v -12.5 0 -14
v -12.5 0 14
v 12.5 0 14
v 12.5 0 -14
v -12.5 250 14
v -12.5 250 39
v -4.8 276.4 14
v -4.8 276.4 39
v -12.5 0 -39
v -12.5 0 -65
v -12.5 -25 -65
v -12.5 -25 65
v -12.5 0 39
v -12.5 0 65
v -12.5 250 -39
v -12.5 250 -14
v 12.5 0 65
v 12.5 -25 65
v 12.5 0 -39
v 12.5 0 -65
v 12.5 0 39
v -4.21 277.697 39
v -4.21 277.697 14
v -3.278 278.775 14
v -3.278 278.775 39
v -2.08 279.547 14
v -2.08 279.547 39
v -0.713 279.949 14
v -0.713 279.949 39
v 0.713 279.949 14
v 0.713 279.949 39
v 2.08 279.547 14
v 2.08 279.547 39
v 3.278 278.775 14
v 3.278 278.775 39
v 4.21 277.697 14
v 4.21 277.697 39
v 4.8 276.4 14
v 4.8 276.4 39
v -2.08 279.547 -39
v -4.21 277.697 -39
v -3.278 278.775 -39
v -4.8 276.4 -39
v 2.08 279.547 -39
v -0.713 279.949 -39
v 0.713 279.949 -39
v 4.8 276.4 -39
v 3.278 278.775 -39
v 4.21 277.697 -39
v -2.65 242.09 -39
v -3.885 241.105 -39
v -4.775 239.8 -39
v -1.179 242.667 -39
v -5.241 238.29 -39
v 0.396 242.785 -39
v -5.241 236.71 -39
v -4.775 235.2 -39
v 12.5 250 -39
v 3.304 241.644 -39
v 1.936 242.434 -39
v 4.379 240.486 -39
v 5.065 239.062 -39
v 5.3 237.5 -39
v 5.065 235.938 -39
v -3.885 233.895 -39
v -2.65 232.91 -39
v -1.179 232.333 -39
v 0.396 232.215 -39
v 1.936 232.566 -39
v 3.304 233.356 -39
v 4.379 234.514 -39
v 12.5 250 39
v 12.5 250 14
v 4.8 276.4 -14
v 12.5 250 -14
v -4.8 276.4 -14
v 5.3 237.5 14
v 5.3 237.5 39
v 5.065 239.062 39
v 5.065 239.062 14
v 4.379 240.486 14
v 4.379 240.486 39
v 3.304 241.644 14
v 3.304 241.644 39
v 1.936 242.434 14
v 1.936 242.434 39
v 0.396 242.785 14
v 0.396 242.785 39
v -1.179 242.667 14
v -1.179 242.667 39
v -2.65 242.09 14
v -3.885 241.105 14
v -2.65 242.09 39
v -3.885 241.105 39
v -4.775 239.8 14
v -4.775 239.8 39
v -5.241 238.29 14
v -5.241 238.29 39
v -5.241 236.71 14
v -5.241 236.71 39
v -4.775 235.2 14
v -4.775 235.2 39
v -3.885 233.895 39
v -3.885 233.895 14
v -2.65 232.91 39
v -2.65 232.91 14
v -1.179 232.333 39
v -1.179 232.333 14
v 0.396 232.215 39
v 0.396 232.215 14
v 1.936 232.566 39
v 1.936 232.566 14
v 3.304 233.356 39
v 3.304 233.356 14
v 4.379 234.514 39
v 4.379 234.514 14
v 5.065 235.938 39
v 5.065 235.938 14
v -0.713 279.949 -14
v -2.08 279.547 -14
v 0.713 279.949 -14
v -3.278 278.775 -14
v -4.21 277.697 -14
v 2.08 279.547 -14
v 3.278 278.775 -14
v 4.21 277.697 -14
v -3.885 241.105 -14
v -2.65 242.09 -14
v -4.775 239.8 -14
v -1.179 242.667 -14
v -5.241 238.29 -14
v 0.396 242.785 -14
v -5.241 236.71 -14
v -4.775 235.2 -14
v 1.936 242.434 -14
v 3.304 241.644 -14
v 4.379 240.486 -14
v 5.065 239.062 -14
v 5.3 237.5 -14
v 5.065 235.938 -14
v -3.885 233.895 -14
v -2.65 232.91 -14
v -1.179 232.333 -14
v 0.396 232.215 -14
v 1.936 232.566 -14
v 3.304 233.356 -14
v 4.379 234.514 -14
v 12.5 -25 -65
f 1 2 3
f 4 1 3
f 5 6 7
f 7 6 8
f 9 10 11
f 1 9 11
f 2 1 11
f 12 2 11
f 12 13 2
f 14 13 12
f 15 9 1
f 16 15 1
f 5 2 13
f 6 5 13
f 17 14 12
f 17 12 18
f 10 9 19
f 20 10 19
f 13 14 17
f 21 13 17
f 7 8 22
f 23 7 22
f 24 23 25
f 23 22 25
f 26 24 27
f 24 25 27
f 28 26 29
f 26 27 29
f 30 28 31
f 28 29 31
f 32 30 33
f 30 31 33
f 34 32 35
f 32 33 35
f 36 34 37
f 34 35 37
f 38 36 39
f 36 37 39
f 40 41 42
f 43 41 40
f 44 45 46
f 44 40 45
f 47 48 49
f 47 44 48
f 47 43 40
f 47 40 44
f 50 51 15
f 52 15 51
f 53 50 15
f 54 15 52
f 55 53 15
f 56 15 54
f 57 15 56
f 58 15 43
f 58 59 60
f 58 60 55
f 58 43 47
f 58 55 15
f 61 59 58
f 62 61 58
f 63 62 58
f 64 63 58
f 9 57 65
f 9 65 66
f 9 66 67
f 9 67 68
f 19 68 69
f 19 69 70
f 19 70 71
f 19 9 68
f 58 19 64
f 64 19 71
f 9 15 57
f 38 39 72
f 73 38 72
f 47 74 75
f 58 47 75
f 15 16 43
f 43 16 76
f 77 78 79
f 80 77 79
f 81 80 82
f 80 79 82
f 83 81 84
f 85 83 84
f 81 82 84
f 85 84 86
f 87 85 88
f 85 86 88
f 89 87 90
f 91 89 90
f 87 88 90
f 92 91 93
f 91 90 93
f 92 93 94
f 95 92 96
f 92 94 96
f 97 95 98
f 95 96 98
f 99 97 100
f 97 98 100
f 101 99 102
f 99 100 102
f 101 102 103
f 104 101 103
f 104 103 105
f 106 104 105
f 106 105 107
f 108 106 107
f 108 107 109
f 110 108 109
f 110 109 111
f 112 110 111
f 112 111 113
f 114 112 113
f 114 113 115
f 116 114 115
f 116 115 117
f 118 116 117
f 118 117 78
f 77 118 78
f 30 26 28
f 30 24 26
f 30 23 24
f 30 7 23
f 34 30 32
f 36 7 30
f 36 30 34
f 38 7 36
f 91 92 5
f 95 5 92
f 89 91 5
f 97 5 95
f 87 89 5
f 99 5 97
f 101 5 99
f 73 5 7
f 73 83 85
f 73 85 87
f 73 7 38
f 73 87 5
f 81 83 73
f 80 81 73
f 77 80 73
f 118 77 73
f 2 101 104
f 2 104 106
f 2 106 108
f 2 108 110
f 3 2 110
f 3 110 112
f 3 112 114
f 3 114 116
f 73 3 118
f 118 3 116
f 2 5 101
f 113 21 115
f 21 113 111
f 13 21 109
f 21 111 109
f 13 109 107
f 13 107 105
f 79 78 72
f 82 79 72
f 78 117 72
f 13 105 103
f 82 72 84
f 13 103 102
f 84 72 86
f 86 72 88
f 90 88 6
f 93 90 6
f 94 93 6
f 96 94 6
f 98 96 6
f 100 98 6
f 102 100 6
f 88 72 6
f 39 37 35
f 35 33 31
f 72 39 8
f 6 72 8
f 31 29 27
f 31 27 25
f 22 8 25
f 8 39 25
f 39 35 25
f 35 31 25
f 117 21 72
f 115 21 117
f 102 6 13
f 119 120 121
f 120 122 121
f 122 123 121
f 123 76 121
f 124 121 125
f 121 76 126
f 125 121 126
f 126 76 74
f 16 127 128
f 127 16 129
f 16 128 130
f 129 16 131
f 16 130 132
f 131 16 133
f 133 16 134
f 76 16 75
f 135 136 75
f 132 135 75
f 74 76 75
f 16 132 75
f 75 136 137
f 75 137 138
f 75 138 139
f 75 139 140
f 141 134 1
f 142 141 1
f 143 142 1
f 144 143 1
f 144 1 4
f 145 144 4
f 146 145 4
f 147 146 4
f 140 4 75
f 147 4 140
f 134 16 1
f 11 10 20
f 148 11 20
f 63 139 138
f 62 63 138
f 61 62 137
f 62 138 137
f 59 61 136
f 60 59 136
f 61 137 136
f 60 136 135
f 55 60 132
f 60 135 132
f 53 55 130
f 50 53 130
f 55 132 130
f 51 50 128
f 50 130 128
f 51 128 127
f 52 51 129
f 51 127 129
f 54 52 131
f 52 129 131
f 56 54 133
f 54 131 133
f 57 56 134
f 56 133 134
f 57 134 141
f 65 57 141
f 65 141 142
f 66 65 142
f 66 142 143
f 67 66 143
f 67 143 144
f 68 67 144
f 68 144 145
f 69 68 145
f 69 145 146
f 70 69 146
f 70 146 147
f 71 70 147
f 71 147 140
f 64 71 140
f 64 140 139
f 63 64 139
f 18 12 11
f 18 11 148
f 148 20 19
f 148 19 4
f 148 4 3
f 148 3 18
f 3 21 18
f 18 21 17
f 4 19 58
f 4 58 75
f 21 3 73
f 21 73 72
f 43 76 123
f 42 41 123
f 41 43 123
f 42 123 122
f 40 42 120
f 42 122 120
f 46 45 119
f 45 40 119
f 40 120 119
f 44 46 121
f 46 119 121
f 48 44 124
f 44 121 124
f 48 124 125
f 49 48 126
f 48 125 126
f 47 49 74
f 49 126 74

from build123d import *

# Parameters (mm, degrees)
SKETCH1_W             = 25
SKETCH1_H             = 25
BOSS_EXTRUDE1_DEPTH   = 250
BOSS_EXTRUDE1_2_DEPTH = 250
SKETCH2_R             = 5.3
CUT_EXTRUDE1_DEPTH    = 263.183618863
BOSS_EXTRUDE2_REACH   = 264.184
SKETCH4_W             = 25
SKETCH4_H             = 28
CUT_EXTRUDE2_DEPTH    = 254.332291665
BOSS_EXTRUDE3_START   = -53
SKETCH5_R             = 5
BOSS_EXTRUDE3_DEPTH   = 28
SKETCH6_W             = 25
SKETCH6_H             = 130
BOSS_EXTRUDE4_DEPTH   = 25
SKETCH7_W             = 25
SKETCH7_H             = 28
CUT_EXTRUDE3_DEPTH    = 323


with BuildPart() as part:
    # Sketch1 → Boss-Extrude1 (new body)
    with BuildSketch(Plane(origin=(0, 0, 0), x_dir=(1, 0, 0), z_dir=(0, 1, 0))):
        with Locations((0, 26.5)):
            Rectangle(SKETCH1_W, SKETCH1_H)
    extrude(amount=BOSS_EXTRUDE1_DEPTH)


with BuildPart() as body_2:
    # Sketch1 → Boss-Extrude1 2 (new body)
    with BuildSketch(Plane(origin=(0, 0, 0), x_dir=(1, 0, 0), z_dir=(0, 1, 0))):
        with Locations((0, -26.5)):
            Rectangle(SKETCH1_W, SKETCH1_H)
    extrude(amount=BOSS_EXTRUDE1_2_DEPTH)


with BuildPart() as cut_extrude1_tool:
    # Sketch2 → Cut-Extrude1 (new, through all)
    with BuildSketch(Plane.XY.offset(39)):
        with Locations((0, 237.5)):
            Circle(SKETCH2_R)
    extrude(amount=-CUT_EXTRUDE1_DEPTH)


with BuildPart() as part_1:
    add(part.part)

    # Cut-Extrude1: cut by cut_extrude1_tool
    add(cut_extrude1_tool.part, mode=Mode.SUBTRACT)

    # Boss-Extrude2: up to this face of the body (flat: up to its plane)
    boss_extrude2_end = Plane(part_1.part.faces().sort_by_distance((0, 123.388798443, -39))[0])
    # Sketch3 → Boss-Extrude2 (add, up to the picked face)
    with BuildSketch(Plane.XY.offset(39), mode=Mode.PRIVATE) as boss_extrude2_sk1:
        with BuildLine():
            Line((-12.5, 250), (-4.8, 276.4))
            ThreePointArc((-4.8, 276.4), (0, 280), (4.8, 276.4))
            Line((4.8, 276.4), (12.5, 250))
            Line((12.5, 250), (-12.5, 250))
        make_face()
    boss_extrude2_tool1 = split(extrude(boss_extrude2_sk1.sketch, amount=-BOSS_EXTRUDE2_REACH, mode=Mode.PRIVATE), bisect_by=boss_extrude2_end, keep=Keep.BOTH, mode=Mode.PRIVATE)


with BuildPart() as body_2_1:
    add(body_2.part)

    # Cut-Extrude1: cut by cut_extrude1_tool
    add(cut_extrude1_tool.part, mode=Mode.SUBTRACT)


with BuildPart() as part_2:
    add(part_1.part)

    add(body_2_1.part)  # Boss-Extrude2 merges body 2
    add(boss_extrude2_tool1.solids().sort_by(Axis((0, 262.12086, 39), (0, 0, -1)))[0])

    # Sketch4 → Cut-Extrude2 (cut, through all)
    with BuildSketch(Plane.XZ.offset(-250)):
        Rectangle(SKETCH4_W, SKETCH4_H)
    extrude(amount=-CUT_EXTRUDE2_DEPTH, mode=Mode.SUBTRACT)


with BuildPart() as cut_extrude2_piece_1:
    # of the separate pieces the step leaves, piece 1, a body of its own (cut_extrude2_pieces)
    add(part_2.part.solids().sort_by_distance((4.8, 276.4, 39))[0])



with BuildPart() as cut_extrude2_piece_2:
    # of the separate pieces the step leaves, piece 2, a body of its own (cut_extrude2_pieces)
    add(part_2.part.solids().sort_by_distance((12.5, 250, -14))[0])


with BuildPart() as cut_extrude2_piece_1_1:
    add(cut_extrude2_piece_1.part)

    add(cut_extrude2_piece_2.part)  # Boss-Extrude3 merges Cut-Extrude2 piece 2
    # Sketch5 → Boss-Extrude3 (add)
    with BuildSketch(Plane(origin=(0, 0, -39), x_dir=(-1, 0, 0), z_dir=(0, 0, -1)).offset(BOSS_EXTRUDE3_START)):
        with Locations(Location((0, 275, 0), (0, 0, 163.739795292))):
            Circle(SKETCH5_R)
    extrude(amount=BOSS_EXTRUDE3_DEPTH)

    # Sketch6 → Boss-Extrude4 (add)
    with BuildSketch(Plane.XZ):
        Rectangle(SKETCH6_W, SKETCH6_H)
    extrude(amount=BOSS_EXTRUDE4_DEPTH)

    # Sketch7 → Cut-Extrude3 (cut)
    with BuildSketch(Plane(origin=(0, 0, 0), x_dir=(1, 0, 0), z_dir=(0, 1, 0))):
        Rectangle(SKETCH7_W, SKETCH7_H)
    extrude(amount=CUT_EXTRUDE3_DEPTH, mode=Mode.SUBTRACT)


solid = cut_extrude2_piece_1_1.part
